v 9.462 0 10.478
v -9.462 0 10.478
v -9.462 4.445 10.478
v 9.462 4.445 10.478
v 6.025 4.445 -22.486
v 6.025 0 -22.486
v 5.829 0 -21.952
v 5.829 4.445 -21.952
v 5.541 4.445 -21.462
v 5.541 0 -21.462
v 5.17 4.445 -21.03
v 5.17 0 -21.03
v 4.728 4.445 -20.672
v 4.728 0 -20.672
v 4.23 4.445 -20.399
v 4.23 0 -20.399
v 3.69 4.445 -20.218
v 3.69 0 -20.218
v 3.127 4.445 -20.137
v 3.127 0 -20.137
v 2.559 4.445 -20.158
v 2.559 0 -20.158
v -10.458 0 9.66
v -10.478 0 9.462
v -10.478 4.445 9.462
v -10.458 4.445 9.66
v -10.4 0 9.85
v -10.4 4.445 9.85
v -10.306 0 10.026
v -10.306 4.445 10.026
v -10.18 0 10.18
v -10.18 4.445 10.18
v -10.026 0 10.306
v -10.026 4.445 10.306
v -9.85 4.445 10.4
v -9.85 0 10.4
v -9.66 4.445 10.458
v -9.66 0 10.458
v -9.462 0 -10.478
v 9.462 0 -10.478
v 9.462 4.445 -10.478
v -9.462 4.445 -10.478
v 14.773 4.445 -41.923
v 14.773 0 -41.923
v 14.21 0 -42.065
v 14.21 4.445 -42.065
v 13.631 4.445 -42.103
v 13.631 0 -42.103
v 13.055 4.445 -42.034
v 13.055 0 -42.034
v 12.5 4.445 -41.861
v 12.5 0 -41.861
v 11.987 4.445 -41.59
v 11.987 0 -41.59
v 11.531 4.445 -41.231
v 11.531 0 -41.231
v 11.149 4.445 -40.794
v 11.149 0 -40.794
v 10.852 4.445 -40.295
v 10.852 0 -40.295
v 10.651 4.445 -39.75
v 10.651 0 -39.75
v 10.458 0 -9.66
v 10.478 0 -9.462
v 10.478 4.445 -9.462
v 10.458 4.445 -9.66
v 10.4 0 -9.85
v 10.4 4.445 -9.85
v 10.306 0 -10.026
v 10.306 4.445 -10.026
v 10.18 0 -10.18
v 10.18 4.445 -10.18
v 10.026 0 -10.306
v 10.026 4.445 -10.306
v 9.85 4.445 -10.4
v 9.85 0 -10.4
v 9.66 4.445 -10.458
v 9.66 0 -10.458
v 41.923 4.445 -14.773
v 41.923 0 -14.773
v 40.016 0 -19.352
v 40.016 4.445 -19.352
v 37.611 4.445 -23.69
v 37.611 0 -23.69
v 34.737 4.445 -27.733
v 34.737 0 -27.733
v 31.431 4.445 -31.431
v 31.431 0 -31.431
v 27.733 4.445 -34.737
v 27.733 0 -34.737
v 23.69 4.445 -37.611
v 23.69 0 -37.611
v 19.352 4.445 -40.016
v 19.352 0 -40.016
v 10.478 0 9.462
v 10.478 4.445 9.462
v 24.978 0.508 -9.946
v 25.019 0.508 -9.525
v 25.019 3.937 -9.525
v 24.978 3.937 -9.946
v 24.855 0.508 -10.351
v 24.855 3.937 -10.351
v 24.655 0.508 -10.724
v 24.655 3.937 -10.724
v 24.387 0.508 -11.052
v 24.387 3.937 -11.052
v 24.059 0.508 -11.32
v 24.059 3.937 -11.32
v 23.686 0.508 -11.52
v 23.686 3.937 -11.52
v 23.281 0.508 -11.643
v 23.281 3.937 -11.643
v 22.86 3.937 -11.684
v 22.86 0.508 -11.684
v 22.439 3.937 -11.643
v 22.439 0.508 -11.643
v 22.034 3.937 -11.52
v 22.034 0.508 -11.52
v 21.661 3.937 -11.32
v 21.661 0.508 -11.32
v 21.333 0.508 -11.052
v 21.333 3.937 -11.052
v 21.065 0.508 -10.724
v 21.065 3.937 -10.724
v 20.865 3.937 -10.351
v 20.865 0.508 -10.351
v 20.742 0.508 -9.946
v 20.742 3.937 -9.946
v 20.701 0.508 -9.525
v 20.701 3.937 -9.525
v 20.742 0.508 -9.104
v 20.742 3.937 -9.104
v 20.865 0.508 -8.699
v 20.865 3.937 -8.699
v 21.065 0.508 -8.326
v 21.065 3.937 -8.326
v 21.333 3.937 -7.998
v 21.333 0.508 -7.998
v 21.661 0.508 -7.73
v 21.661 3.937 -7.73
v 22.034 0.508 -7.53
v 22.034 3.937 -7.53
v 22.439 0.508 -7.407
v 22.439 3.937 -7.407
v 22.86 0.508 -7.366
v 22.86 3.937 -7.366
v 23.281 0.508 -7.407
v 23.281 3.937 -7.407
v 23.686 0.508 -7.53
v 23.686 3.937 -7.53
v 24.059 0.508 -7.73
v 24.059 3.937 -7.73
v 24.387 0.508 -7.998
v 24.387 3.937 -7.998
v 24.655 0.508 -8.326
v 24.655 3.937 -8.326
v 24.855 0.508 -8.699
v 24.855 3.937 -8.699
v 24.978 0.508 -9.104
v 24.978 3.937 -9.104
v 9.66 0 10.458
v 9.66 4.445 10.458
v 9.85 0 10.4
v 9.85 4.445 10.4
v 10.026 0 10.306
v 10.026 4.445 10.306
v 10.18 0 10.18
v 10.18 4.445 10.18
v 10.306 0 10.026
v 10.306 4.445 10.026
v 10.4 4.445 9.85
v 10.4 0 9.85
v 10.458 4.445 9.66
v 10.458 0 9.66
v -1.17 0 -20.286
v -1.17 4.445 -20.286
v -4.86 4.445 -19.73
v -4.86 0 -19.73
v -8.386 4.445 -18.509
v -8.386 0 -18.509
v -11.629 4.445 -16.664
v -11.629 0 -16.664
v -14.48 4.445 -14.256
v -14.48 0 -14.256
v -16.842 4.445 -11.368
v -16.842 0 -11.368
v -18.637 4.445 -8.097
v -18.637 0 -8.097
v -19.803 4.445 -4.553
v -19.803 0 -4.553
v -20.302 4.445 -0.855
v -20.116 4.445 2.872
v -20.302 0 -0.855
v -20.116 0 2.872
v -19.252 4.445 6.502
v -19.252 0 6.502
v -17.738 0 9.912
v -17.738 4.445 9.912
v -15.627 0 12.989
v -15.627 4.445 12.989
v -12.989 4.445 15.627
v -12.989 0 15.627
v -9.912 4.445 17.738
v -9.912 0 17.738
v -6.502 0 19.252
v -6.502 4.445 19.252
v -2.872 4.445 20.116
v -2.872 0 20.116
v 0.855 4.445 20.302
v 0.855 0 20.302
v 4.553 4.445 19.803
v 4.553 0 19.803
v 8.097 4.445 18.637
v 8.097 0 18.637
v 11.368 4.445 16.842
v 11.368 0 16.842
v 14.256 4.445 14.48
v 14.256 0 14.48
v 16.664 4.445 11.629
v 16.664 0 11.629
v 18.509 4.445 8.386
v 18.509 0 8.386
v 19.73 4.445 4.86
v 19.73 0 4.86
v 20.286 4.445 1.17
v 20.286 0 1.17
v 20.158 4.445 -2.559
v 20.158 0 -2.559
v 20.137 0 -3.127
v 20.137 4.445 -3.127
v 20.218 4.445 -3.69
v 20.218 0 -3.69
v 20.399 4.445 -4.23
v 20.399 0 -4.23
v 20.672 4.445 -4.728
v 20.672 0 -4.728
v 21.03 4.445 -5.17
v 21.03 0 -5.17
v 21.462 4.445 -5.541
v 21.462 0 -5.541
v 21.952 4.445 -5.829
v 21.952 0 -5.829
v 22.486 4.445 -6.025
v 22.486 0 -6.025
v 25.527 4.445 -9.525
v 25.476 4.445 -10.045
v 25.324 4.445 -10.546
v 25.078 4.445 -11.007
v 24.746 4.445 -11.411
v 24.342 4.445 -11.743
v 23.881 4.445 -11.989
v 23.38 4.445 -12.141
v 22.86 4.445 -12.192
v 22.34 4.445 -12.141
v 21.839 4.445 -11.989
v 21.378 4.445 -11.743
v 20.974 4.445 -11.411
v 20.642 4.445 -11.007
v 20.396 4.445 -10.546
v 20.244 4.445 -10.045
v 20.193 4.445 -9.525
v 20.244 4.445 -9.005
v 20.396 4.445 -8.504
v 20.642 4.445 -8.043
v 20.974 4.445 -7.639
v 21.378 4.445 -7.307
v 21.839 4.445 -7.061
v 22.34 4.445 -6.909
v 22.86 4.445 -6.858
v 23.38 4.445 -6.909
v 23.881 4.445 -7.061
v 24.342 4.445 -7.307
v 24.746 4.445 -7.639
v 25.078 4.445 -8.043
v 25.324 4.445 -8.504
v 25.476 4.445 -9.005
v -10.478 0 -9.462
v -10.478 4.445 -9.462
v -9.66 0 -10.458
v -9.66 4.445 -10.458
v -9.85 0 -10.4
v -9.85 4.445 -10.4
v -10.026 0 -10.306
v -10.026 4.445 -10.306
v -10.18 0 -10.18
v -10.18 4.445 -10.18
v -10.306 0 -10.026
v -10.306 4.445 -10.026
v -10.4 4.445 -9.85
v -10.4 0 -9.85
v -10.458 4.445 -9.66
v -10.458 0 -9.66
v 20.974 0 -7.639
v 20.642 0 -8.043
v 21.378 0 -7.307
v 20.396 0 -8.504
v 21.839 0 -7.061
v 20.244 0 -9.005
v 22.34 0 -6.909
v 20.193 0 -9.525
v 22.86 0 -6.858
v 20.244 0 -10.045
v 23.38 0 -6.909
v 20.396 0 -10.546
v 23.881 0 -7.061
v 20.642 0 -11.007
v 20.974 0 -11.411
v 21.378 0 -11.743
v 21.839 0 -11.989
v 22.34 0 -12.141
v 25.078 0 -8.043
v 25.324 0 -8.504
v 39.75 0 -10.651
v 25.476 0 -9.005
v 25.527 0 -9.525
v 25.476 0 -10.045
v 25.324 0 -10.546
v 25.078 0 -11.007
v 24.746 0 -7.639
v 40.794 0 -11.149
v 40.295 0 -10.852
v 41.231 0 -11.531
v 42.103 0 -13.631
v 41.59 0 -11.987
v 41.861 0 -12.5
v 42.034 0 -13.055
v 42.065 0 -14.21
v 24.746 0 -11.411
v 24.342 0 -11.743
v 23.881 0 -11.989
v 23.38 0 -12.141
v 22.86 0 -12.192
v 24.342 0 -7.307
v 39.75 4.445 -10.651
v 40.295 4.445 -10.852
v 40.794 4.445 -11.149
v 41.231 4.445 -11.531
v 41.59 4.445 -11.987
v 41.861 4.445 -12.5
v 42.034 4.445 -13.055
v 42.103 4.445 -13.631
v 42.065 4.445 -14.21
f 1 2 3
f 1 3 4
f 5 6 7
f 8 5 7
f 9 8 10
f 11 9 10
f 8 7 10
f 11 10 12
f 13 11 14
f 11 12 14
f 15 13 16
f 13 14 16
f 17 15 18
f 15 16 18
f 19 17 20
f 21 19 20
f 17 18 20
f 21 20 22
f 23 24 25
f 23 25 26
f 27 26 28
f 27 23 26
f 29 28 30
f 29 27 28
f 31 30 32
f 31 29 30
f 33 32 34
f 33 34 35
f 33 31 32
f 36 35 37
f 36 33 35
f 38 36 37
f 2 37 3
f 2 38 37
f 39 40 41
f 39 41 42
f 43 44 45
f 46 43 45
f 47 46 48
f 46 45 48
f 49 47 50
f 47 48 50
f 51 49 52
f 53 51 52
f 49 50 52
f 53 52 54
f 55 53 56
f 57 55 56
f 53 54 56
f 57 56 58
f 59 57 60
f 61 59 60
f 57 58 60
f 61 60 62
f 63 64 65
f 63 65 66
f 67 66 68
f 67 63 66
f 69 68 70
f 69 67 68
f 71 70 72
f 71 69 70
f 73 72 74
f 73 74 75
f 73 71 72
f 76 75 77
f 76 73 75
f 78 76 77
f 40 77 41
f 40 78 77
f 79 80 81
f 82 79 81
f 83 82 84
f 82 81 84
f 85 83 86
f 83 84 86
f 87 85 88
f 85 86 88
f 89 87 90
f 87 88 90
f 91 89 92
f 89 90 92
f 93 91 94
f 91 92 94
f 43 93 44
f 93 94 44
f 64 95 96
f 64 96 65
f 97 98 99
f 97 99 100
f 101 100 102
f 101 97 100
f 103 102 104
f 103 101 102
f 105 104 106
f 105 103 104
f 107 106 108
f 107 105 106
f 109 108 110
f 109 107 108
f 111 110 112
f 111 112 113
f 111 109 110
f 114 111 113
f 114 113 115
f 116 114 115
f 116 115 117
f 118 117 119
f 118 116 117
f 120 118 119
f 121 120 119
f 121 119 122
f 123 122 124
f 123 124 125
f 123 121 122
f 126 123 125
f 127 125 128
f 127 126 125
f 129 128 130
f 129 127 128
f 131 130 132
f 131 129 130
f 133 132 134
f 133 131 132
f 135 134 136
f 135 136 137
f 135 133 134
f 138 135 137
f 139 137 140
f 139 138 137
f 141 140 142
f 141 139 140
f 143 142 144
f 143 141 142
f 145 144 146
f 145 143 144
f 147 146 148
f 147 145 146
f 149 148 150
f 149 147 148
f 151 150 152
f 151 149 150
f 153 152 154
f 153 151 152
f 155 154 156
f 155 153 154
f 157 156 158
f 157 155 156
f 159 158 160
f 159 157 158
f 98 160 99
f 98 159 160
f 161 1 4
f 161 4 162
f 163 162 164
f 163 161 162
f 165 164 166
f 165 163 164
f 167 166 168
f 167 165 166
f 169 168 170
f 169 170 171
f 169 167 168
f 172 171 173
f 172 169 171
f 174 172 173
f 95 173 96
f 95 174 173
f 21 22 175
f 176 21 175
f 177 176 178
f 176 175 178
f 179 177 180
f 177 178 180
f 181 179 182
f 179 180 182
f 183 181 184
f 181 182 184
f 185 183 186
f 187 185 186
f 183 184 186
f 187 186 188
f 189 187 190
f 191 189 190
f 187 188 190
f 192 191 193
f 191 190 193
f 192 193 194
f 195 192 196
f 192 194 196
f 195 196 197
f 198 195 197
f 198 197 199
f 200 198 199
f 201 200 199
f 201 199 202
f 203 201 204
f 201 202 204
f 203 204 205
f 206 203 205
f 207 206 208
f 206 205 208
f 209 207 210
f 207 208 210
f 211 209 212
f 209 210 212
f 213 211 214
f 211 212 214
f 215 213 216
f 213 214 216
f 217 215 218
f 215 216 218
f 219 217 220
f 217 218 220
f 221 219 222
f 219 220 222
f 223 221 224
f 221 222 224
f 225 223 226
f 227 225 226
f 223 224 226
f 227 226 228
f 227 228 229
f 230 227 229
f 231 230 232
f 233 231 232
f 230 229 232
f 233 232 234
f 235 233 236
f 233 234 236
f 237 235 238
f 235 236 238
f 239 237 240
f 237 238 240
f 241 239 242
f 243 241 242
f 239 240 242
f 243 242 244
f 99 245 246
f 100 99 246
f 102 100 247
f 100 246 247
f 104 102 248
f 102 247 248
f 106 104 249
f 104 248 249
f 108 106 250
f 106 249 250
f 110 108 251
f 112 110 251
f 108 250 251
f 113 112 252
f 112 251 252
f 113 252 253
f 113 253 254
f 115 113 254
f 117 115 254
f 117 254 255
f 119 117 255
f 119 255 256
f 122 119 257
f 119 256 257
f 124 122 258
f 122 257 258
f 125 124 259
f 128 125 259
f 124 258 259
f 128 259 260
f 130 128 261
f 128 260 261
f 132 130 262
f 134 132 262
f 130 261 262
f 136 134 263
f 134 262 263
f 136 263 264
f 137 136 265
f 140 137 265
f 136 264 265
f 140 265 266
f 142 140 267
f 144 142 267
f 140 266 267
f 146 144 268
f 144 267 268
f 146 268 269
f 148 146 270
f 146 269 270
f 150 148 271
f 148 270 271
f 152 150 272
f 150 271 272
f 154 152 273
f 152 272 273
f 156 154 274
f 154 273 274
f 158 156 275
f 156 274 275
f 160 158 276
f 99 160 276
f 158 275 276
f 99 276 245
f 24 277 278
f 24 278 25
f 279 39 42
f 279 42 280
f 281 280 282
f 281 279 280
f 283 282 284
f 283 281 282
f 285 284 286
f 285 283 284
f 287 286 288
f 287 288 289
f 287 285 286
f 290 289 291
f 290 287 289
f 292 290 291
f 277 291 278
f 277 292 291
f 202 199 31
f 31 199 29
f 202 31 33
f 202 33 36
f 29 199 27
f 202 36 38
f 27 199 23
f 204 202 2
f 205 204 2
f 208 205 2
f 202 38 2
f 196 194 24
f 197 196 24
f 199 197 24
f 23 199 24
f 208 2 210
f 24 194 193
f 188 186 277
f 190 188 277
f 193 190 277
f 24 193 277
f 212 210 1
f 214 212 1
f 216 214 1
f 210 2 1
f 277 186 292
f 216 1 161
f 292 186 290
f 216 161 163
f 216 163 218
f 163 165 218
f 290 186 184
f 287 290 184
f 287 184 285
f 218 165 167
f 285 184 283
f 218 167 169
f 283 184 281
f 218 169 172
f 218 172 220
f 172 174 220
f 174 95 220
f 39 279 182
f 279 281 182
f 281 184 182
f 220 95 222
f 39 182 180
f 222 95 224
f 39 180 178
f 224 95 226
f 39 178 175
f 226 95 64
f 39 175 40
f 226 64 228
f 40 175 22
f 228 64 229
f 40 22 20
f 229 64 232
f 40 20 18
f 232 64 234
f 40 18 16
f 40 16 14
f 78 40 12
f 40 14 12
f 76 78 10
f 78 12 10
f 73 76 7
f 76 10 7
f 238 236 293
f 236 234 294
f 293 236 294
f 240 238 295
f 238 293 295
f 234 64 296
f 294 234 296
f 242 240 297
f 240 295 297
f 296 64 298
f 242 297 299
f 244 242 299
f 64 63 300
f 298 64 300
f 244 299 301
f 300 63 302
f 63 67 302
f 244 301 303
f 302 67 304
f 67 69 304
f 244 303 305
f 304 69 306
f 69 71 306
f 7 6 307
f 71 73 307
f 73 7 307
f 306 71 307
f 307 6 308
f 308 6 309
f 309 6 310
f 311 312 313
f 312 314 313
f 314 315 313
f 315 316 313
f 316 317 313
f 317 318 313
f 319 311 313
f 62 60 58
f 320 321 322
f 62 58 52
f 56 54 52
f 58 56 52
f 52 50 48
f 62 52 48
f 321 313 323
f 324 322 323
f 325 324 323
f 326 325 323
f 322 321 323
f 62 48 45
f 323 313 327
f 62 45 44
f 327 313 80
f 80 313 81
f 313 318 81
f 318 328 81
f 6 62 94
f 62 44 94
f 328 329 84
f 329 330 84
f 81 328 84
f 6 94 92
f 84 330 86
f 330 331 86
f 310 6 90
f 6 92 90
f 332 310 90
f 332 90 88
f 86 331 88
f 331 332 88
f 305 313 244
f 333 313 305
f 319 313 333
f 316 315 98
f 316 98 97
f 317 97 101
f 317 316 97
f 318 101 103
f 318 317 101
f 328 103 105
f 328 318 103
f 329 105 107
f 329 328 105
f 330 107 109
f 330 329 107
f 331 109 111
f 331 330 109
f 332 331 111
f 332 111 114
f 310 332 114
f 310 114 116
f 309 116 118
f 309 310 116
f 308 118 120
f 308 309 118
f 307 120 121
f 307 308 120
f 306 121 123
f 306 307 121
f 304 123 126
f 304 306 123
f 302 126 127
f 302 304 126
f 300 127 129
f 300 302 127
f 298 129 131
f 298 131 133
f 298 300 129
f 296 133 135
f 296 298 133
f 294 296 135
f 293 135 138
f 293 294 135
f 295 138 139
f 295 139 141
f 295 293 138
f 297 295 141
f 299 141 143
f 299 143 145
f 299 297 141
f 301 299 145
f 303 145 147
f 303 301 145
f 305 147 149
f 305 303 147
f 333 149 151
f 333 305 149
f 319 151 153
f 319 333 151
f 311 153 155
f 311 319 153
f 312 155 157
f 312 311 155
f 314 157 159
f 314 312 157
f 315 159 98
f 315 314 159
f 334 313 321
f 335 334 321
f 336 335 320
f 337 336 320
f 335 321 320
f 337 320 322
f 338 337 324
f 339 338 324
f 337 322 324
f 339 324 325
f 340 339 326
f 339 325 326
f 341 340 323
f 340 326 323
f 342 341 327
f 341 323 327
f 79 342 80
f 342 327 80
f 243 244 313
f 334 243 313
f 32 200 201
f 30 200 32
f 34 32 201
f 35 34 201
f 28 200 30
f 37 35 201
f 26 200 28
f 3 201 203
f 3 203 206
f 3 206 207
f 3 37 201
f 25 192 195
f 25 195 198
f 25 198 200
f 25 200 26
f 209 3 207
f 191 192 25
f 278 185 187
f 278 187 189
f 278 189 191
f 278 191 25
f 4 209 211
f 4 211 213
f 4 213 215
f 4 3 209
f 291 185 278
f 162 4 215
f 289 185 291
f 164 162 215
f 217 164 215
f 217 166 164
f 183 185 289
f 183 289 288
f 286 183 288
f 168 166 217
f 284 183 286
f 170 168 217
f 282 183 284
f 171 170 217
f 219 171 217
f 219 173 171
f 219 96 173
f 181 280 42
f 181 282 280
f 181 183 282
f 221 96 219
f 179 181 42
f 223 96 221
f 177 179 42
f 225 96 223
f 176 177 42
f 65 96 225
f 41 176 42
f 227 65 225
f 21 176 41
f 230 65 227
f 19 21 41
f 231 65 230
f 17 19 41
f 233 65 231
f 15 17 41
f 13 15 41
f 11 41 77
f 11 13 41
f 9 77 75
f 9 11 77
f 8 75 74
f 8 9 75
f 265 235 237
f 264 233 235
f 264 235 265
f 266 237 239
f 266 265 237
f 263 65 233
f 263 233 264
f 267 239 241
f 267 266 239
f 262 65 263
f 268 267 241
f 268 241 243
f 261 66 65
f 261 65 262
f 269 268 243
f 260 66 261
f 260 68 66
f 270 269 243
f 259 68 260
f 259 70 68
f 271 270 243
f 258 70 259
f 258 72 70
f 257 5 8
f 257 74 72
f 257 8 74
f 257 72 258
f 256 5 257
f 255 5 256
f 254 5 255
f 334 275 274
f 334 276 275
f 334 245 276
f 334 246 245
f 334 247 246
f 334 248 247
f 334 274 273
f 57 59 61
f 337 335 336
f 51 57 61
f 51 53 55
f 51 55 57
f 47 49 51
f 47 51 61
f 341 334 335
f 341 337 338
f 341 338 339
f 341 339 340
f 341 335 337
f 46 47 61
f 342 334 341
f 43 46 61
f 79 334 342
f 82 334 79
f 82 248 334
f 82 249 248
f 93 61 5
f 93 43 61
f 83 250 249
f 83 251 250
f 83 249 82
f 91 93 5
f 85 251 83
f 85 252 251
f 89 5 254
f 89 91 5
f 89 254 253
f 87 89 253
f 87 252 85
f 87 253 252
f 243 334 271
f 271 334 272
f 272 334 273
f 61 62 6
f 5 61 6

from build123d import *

# Parameters (mm, degrees)
SKETCH3_R           = 2.159
BOSS_EXTRUDE1_DEPTH = 4.445
CHAMFER1_SIZE       = 0.508


with BuildPart() as part:
    # Sketch3 → Boss-Extrude1 (new body)
    with BuildSketch(Plane(origin=(0, 0, 0), x_dir=(1, 0, 0), z_dir=(0, 1, 0))):
        with BuildLine():
            Line((10.651103406, 39.750459069), (6.025173957, 22.486255331))
            ThreePointArc((6.025173957, 22.486255331), (4.728428182, 20.672198197), (2.558581153, 20.158275285))
            ThreePointArc((2.558581153, 20.158275285), (-14.368409794, -14.368409794), (20.158275285, 2.558581153))
            ThreePointArc((20.158275285, 2.558581153), (20.672198197, 4.728428182), (22.486255331, 6.025173957))
            Line((22.486255331, 6.025173957), (39.750459069, 10.651103406))
            ThreePointArc((39.750459069, 10.651103406), (41.737404706, 12.237427719), (41.923224647, 14.773142359))
            ThreePointArc((41.923224647, 14.773142359), (31.430896424, 31.430896424), (14.773142359, 41.923224647))
            ThreePointArc((14.773142359, 41.923224647), (12.237427719, 41.737404706), (10.651103406, 39.750459069))
        make_face()
        with Locations((22.86, 9.525)):
            Circle(SKETCH3_R, mode=Mode.SUBTRACT)
        with BuildLine():
            Line((-9.4615, -10.4775), (9.4615, -10.4775))
            ThreePointArc((9.4615, -10.4775), (10.17992049, -10.17992049), (10.4775, -9.4615))
            Line((10.4775, -9.4615), (10.4775, 9.4615))
            ThreePointArc((10.4775, 9.4615), (10.17992049, 10.17992049), (9.4615, 10.4775))
            Line((9.4615, 10.4775), (-9.4615, 10.4775))
            ThreePointArc((-9.4615, 10.4775), (-10.17992049, 10.17992049), (-10.4775, 9.4615))
            Line((-10.4775, 9.4615), (-10.4775, -9.4615))
            ThreePointArc((-10.4775, -9.4615), (-10.17992049, -10.17992049), (-9.4615, -10.4775))
        make_face(mode=Mode.SUBTRACT)
    extrude(amount=BOSS_EXTRUDE1_DEPTH)

    # Chamfer1
    chamfer1_edges = [part.edges().sort_by_distance(p)[0] for p in [
        (20.701, 0, -9.525),
        (20.701, 4.445, -9.525),
    ]]
    chamfer(chamfer1_edges, length=CHAMFER1_SIZE)


solid = part.part
